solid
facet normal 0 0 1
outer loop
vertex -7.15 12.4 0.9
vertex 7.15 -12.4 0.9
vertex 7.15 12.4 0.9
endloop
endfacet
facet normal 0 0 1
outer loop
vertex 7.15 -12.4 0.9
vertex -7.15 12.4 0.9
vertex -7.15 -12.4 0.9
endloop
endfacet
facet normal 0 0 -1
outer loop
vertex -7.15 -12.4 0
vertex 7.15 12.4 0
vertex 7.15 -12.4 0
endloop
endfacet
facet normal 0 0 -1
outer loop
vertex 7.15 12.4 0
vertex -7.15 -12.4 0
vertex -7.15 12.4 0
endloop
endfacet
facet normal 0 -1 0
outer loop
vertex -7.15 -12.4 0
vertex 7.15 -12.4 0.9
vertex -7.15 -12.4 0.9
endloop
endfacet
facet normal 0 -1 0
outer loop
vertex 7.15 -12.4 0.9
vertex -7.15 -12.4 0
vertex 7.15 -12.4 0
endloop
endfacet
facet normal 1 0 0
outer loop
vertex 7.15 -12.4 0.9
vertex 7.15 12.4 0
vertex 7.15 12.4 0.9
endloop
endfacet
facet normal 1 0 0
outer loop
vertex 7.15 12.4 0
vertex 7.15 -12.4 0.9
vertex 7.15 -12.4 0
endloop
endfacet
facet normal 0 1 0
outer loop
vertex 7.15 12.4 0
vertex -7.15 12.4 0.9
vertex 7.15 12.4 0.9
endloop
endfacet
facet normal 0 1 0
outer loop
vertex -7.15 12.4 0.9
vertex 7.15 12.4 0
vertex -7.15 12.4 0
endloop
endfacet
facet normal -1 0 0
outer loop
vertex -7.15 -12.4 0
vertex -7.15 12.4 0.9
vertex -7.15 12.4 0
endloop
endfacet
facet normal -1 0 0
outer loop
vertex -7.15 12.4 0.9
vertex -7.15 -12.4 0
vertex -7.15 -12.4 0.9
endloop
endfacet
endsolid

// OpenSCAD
fudge = 0.1;

module esp() {
    w = 14.3;
    h = 24.8;
    translate([-1 * w / 2, -1 * h / 2, 0]) cube([w, h, 0.9]);
}

esp();
